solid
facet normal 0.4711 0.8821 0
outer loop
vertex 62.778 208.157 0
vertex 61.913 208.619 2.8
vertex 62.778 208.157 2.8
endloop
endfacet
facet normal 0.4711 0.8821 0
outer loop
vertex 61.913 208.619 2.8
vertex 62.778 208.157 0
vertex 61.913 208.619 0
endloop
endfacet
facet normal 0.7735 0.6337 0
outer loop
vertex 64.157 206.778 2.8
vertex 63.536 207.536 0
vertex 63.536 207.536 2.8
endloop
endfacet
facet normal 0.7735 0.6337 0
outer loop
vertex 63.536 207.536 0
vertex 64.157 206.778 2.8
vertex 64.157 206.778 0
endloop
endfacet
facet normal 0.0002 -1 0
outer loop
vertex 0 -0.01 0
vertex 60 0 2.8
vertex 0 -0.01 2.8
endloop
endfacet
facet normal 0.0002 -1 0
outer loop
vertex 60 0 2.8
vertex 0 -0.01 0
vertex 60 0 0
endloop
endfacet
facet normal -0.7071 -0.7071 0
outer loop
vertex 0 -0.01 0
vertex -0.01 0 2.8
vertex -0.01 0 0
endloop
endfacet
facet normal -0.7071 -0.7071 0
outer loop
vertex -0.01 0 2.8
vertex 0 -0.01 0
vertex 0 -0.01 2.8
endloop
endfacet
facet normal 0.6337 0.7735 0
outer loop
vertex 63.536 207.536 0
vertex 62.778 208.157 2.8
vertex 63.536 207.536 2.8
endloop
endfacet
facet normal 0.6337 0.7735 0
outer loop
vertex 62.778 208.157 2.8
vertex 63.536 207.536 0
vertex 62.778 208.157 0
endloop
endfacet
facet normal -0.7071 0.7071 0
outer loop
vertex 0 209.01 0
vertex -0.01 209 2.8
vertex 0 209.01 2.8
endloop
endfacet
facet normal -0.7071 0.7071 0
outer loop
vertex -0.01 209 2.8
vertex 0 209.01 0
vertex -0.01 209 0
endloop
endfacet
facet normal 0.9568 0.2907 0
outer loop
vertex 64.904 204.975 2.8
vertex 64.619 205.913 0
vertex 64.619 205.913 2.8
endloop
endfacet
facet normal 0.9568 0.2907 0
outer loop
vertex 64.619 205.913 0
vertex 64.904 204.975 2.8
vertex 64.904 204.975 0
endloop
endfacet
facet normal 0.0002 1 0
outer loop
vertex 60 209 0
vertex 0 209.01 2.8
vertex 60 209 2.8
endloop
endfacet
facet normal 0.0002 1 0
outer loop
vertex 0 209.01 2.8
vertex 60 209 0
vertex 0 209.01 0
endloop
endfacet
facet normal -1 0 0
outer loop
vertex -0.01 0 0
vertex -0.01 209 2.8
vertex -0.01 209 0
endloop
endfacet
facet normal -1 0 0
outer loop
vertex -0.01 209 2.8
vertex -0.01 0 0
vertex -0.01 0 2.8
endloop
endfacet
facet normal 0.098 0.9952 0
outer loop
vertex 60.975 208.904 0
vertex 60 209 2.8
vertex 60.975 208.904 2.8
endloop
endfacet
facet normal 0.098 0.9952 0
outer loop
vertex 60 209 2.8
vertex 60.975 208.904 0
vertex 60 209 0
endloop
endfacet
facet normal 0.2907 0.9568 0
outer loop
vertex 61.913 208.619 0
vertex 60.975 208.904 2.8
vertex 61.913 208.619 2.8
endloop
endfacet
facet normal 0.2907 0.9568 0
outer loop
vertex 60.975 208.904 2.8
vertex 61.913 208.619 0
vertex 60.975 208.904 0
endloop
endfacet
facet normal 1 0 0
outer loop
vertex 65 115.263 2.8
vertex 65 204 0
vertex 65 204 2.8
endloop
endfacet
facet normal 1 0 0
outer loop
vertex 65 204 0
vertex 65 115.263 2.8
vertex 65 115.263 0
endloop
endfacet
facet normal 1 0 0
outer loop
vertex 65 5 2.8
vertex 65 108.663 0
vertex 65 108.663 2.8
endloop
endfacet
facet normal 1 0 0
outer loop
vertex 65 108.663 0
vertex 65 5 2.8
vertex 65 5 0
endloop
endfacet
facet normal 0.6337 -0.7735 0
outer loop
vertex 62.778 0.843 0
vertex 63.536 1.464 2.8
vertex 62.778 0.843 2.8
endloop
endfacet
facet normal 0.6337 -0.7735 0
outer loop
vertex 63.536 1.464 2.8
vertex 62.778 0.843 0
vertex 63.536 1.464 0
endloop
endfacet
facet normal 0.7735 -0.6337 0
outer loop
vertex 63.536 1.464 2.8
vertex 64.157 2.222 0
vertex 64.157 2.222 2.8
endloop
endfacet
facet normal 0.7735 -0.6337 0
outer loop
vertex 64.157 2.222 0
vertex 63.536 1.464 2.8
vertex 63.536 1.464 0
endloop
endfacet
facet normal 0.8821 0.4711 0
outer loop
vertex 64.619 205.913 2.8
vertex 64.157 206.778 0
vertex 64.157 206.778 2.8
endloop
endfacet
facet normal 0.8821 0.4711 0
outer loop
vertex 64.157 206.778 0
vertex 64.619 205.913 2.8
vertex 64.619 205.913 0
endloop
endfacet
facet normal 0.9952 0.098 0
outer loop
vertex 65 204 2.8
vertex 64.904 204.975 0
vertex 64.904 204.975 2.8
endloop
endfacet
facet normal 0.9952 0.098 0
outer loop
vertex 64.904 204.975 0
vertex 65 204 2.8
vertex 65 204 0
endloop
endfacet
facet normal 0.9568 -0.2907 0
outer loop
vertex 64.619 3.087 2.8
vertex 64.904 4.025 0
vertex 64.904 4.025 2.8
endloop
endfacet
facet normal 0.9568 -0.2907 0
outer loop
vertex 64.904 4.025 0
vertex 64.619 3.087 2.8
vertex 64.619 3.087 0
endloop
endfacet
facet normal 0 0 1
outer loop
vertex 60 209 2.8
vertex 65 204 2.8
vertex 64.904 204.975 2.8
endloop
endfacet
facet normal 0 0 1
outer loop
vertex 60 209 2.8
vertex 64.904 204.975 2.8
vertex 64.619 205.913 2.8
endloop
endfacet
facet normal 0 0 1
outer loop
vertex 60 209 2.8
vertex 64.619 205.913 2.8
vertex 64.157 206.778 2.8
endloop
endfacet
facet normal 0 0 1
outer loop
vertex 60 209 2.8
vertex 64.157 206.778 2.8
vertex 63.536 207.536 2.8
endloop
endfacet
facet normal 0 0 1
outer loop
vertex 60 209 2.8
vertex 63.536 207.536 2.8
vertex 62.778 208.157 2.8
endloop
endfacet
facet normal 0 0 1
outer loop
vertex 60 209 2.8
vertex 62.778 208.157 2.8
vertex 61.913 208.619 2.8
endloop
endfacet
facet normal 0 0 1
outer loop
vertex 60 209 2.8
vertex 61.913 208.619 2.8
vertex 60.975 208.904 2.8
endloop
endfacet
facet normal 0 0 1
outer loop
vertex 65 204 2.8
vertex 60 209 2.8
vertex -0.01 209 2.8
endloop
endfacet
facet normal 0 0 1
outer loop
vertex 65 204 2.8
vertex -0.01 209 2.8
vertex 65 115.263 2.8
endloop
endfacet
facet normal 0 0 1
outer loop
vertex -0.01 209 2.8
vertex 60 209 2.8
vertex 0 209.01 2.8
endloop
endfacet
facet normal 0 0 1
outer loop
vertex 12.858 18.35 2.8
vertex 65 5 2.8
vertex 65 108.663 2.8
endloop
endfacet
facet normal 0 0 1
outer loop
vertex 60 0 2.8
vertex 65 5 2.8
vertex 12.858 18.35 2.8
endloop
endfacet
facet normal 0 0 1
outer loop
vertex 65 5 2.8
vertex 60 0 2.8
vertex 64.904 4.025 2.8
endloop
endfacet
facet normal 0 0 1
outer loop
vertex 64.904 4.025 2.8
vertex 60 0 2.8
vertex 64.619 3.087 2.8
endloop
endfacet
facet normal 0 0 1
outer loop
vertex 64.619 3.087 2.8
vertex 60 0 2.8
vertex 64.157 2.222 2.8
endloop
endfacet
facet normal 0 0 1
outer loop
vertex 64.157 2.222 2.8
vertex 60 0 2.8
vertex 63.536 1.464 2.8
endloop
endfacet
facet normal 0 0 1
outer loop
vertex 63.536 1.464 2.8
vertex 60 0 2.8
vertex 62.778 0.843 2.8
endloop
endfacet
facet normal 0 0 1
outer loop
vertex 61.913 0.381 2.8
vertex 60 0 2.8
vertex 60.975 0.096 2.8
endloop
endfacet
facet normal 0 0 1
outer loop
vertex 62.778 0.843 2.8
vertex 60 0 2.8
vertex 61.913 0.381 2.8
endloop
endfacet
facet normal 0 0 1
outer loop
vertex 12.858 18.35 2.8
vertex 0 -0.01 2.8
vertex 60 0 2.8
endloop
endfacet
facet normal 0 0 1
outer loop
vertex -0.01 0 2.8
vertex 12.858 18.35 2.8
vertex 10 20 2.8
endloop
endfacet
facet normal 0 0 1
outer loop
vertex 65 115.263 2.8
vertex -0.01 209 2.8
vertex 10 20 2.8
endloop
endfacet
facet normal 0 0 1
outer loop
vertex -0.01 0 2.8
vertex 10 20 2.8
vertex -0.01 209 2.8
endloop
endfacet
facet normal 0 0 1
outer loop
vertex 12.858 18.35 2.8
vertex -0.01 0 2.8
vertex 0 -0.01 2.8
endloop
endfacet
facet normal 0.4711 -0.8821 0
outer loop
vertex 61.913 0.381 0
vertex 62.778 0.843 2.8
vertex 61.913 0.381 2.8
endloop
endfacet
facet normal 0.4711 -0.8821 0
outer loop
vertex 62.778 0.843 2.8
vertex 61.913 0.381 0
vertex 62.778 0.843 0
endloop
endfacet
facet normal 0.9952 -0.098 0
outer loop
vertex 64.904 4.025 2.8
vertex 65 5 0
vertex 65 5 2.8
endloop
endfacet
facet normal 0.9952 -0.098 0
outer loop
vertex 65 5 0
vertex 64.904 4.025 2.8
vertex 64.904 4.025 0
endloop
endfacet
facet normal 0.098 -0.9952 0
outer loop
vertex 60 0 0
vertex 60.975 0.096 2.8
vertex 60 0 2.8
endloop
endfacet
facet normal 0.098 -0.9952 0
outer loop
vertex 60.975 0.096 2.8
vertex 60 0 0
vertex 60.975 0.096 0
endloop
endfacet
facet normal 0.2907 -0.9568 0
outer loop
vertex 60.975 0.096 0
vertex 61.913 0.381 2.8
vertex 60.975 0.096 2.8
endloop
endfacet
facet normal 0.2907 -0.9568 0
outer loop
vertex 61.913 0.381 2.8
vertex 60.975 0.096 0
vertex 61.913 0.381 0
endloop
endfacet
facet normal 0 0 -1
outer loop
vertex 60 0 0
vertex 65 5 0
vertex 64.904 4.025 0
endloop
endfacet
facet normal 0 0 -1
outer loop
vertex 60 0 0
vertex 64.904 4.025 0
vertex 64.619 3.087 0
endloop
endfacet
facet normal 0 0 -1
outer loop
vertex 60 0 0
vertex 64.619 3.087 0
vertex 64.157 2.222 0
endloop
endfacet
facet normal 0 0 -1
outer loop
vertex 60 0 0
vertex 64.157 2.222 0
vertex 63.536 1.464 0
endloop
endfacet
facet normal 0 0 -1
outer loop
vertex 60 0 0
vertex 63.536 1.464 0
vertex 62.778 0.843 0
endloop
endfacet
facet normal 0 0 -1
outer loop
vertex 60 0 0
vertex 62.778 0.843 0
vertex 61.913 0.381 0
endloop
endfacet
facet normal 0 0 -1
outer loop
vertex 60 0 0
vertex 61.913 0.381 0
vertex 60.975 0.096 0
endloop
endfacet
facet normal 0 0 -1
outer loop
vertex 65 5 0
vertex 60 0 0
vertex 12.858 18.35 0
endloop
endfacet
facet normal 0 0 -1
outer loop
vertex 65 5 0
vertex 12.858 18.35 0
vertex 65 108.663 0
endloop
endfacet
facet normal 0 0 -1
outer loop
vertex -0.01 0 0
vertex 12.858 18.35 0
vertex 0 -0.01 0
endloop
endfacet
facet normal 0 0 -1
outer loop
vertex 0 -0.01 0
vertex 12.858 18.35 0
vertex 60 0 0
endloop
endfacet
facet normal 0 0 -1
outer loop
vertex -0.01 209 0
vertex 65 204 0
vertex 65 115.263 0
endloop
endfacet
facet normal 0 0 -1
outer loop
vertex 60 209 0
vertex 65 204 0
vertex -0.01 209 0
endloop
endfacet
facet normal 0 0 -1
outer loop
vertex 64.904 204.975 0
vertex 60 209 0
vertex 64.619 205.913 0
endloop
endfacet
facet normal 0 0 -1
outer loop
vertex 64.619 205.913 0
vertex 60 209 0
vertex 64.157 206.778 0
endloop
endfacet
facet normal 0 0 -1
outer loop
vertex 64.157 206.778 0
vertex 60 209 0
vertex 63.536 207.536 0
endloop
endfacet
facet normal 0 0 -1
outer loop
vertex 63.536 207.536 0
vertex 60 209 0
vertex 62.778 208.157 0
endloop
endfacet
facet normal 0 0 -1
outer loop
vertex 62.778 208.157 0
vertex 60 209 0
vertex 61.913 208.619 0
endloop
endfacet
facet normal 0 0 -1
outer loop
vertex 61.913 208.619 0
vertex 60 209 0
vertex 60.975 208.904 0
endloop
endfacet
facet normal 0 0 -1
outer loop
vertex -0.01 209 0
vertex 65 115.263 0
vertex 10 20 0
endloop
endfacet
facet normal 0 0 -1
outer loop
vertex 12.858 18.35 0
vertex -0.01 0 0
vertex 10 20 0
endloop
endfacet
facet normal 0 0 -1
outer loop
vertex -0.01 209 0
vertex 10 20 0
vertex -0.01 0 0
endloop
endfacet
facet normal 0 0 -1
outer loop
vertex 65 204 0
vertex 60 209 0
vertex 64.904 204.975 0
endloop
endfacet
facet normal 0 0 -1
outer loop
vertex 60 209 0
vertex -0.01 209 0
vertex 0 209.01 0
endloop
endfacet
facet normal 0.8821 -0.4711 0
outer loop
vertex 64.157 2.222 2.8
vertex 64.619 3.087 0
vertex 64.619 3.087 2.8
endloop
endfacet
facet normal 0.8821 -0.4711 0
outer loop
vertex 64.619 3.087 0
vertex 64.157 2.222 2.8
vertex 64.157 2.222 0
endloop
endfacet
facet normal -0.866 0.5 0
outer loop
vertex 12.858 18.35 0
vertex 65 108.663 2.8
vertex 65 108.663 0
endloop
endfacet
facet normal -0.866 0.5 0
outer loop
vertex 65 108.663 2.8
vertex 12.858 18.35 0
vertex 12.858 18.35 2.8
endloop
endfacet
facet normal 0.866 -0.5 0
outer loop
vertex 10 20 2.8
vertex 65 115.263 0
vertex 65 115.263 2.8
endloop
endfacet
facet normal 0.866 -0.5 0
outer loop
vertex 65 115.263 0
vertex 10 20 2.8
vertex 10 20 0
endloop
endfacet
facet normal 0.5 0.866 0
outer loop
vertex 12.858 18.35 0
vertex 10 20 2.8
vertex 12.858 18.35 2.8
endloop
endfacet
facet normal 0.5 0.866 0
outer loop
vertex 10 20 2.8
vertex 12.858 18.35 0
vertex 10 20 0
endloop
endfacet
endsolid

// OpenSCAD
// 滑槽拼接 - 对角线方向
// B部分：65mm × 209mm × 2.8mm
// 滑舌：右上向左下

// 参数
width = 65;      // 宽度 (mm)
height = 209;    // 高度 (mm)
thickness = 2.8; // 厚度 (mm)
corner_radius = 5;  // 倒角半径 (mm)

// 滑槽参数（与A部分匹配）
slot_depth = 3.3;     // 滑舌长度 (mm，比槽长0.3mm)
slot_height = 2.8;    // 滑舌高度 (mm，等于厚度）
slot_length = 180;    // 滑舌长度 (mm) - 对角线
slot_offset_x = 10;   // 滑舌起点X偏移
slot_offset_y = 20;   // 滑舌起点Y偏移
slot_angle = 30;       // 滑舌对角线角度 (度)
tolerance = 0.3;       // 配合公差

// 圆角矩形模块（左侧不倒角）
module rounded_rect_left_flat(w, h, r, t) {
    hull() {
        translate([0, 0, 0]) cylinder(h = t, r = 0.01, $fn = 4);
        translate([0, h, 0]) cylinder(h = t, r = 0.01, $fn = 4);
        translate([w - r, h - r, 0]) cylinder(h = t, r = r, $fn = 32);
        translate([w - r, r, 0]) cylinder(h = t, r = r, $fn = 32);
    }
}

// 创建主体
difference() {
    // 面板主体
    color("LightGray") {
        rounded_rect_left_flat(width, height, corner_radius, thickness);
    }

    // 对角线滑舌（右上向左下）
    color("Blue") {
        translate([slot_offset_x, slot_offset_y, 0])
        rotate([0, 0, -slot_angle])
        cube([slot_depth, slot_length, slot_height]);
    }
}

// 装配预览（打印时可注释掉）
/*
color("LightGray", 0.3)
translate([-slot_depth, 0, 0])
import("part_A_slot_diagonal.stl");
*/
